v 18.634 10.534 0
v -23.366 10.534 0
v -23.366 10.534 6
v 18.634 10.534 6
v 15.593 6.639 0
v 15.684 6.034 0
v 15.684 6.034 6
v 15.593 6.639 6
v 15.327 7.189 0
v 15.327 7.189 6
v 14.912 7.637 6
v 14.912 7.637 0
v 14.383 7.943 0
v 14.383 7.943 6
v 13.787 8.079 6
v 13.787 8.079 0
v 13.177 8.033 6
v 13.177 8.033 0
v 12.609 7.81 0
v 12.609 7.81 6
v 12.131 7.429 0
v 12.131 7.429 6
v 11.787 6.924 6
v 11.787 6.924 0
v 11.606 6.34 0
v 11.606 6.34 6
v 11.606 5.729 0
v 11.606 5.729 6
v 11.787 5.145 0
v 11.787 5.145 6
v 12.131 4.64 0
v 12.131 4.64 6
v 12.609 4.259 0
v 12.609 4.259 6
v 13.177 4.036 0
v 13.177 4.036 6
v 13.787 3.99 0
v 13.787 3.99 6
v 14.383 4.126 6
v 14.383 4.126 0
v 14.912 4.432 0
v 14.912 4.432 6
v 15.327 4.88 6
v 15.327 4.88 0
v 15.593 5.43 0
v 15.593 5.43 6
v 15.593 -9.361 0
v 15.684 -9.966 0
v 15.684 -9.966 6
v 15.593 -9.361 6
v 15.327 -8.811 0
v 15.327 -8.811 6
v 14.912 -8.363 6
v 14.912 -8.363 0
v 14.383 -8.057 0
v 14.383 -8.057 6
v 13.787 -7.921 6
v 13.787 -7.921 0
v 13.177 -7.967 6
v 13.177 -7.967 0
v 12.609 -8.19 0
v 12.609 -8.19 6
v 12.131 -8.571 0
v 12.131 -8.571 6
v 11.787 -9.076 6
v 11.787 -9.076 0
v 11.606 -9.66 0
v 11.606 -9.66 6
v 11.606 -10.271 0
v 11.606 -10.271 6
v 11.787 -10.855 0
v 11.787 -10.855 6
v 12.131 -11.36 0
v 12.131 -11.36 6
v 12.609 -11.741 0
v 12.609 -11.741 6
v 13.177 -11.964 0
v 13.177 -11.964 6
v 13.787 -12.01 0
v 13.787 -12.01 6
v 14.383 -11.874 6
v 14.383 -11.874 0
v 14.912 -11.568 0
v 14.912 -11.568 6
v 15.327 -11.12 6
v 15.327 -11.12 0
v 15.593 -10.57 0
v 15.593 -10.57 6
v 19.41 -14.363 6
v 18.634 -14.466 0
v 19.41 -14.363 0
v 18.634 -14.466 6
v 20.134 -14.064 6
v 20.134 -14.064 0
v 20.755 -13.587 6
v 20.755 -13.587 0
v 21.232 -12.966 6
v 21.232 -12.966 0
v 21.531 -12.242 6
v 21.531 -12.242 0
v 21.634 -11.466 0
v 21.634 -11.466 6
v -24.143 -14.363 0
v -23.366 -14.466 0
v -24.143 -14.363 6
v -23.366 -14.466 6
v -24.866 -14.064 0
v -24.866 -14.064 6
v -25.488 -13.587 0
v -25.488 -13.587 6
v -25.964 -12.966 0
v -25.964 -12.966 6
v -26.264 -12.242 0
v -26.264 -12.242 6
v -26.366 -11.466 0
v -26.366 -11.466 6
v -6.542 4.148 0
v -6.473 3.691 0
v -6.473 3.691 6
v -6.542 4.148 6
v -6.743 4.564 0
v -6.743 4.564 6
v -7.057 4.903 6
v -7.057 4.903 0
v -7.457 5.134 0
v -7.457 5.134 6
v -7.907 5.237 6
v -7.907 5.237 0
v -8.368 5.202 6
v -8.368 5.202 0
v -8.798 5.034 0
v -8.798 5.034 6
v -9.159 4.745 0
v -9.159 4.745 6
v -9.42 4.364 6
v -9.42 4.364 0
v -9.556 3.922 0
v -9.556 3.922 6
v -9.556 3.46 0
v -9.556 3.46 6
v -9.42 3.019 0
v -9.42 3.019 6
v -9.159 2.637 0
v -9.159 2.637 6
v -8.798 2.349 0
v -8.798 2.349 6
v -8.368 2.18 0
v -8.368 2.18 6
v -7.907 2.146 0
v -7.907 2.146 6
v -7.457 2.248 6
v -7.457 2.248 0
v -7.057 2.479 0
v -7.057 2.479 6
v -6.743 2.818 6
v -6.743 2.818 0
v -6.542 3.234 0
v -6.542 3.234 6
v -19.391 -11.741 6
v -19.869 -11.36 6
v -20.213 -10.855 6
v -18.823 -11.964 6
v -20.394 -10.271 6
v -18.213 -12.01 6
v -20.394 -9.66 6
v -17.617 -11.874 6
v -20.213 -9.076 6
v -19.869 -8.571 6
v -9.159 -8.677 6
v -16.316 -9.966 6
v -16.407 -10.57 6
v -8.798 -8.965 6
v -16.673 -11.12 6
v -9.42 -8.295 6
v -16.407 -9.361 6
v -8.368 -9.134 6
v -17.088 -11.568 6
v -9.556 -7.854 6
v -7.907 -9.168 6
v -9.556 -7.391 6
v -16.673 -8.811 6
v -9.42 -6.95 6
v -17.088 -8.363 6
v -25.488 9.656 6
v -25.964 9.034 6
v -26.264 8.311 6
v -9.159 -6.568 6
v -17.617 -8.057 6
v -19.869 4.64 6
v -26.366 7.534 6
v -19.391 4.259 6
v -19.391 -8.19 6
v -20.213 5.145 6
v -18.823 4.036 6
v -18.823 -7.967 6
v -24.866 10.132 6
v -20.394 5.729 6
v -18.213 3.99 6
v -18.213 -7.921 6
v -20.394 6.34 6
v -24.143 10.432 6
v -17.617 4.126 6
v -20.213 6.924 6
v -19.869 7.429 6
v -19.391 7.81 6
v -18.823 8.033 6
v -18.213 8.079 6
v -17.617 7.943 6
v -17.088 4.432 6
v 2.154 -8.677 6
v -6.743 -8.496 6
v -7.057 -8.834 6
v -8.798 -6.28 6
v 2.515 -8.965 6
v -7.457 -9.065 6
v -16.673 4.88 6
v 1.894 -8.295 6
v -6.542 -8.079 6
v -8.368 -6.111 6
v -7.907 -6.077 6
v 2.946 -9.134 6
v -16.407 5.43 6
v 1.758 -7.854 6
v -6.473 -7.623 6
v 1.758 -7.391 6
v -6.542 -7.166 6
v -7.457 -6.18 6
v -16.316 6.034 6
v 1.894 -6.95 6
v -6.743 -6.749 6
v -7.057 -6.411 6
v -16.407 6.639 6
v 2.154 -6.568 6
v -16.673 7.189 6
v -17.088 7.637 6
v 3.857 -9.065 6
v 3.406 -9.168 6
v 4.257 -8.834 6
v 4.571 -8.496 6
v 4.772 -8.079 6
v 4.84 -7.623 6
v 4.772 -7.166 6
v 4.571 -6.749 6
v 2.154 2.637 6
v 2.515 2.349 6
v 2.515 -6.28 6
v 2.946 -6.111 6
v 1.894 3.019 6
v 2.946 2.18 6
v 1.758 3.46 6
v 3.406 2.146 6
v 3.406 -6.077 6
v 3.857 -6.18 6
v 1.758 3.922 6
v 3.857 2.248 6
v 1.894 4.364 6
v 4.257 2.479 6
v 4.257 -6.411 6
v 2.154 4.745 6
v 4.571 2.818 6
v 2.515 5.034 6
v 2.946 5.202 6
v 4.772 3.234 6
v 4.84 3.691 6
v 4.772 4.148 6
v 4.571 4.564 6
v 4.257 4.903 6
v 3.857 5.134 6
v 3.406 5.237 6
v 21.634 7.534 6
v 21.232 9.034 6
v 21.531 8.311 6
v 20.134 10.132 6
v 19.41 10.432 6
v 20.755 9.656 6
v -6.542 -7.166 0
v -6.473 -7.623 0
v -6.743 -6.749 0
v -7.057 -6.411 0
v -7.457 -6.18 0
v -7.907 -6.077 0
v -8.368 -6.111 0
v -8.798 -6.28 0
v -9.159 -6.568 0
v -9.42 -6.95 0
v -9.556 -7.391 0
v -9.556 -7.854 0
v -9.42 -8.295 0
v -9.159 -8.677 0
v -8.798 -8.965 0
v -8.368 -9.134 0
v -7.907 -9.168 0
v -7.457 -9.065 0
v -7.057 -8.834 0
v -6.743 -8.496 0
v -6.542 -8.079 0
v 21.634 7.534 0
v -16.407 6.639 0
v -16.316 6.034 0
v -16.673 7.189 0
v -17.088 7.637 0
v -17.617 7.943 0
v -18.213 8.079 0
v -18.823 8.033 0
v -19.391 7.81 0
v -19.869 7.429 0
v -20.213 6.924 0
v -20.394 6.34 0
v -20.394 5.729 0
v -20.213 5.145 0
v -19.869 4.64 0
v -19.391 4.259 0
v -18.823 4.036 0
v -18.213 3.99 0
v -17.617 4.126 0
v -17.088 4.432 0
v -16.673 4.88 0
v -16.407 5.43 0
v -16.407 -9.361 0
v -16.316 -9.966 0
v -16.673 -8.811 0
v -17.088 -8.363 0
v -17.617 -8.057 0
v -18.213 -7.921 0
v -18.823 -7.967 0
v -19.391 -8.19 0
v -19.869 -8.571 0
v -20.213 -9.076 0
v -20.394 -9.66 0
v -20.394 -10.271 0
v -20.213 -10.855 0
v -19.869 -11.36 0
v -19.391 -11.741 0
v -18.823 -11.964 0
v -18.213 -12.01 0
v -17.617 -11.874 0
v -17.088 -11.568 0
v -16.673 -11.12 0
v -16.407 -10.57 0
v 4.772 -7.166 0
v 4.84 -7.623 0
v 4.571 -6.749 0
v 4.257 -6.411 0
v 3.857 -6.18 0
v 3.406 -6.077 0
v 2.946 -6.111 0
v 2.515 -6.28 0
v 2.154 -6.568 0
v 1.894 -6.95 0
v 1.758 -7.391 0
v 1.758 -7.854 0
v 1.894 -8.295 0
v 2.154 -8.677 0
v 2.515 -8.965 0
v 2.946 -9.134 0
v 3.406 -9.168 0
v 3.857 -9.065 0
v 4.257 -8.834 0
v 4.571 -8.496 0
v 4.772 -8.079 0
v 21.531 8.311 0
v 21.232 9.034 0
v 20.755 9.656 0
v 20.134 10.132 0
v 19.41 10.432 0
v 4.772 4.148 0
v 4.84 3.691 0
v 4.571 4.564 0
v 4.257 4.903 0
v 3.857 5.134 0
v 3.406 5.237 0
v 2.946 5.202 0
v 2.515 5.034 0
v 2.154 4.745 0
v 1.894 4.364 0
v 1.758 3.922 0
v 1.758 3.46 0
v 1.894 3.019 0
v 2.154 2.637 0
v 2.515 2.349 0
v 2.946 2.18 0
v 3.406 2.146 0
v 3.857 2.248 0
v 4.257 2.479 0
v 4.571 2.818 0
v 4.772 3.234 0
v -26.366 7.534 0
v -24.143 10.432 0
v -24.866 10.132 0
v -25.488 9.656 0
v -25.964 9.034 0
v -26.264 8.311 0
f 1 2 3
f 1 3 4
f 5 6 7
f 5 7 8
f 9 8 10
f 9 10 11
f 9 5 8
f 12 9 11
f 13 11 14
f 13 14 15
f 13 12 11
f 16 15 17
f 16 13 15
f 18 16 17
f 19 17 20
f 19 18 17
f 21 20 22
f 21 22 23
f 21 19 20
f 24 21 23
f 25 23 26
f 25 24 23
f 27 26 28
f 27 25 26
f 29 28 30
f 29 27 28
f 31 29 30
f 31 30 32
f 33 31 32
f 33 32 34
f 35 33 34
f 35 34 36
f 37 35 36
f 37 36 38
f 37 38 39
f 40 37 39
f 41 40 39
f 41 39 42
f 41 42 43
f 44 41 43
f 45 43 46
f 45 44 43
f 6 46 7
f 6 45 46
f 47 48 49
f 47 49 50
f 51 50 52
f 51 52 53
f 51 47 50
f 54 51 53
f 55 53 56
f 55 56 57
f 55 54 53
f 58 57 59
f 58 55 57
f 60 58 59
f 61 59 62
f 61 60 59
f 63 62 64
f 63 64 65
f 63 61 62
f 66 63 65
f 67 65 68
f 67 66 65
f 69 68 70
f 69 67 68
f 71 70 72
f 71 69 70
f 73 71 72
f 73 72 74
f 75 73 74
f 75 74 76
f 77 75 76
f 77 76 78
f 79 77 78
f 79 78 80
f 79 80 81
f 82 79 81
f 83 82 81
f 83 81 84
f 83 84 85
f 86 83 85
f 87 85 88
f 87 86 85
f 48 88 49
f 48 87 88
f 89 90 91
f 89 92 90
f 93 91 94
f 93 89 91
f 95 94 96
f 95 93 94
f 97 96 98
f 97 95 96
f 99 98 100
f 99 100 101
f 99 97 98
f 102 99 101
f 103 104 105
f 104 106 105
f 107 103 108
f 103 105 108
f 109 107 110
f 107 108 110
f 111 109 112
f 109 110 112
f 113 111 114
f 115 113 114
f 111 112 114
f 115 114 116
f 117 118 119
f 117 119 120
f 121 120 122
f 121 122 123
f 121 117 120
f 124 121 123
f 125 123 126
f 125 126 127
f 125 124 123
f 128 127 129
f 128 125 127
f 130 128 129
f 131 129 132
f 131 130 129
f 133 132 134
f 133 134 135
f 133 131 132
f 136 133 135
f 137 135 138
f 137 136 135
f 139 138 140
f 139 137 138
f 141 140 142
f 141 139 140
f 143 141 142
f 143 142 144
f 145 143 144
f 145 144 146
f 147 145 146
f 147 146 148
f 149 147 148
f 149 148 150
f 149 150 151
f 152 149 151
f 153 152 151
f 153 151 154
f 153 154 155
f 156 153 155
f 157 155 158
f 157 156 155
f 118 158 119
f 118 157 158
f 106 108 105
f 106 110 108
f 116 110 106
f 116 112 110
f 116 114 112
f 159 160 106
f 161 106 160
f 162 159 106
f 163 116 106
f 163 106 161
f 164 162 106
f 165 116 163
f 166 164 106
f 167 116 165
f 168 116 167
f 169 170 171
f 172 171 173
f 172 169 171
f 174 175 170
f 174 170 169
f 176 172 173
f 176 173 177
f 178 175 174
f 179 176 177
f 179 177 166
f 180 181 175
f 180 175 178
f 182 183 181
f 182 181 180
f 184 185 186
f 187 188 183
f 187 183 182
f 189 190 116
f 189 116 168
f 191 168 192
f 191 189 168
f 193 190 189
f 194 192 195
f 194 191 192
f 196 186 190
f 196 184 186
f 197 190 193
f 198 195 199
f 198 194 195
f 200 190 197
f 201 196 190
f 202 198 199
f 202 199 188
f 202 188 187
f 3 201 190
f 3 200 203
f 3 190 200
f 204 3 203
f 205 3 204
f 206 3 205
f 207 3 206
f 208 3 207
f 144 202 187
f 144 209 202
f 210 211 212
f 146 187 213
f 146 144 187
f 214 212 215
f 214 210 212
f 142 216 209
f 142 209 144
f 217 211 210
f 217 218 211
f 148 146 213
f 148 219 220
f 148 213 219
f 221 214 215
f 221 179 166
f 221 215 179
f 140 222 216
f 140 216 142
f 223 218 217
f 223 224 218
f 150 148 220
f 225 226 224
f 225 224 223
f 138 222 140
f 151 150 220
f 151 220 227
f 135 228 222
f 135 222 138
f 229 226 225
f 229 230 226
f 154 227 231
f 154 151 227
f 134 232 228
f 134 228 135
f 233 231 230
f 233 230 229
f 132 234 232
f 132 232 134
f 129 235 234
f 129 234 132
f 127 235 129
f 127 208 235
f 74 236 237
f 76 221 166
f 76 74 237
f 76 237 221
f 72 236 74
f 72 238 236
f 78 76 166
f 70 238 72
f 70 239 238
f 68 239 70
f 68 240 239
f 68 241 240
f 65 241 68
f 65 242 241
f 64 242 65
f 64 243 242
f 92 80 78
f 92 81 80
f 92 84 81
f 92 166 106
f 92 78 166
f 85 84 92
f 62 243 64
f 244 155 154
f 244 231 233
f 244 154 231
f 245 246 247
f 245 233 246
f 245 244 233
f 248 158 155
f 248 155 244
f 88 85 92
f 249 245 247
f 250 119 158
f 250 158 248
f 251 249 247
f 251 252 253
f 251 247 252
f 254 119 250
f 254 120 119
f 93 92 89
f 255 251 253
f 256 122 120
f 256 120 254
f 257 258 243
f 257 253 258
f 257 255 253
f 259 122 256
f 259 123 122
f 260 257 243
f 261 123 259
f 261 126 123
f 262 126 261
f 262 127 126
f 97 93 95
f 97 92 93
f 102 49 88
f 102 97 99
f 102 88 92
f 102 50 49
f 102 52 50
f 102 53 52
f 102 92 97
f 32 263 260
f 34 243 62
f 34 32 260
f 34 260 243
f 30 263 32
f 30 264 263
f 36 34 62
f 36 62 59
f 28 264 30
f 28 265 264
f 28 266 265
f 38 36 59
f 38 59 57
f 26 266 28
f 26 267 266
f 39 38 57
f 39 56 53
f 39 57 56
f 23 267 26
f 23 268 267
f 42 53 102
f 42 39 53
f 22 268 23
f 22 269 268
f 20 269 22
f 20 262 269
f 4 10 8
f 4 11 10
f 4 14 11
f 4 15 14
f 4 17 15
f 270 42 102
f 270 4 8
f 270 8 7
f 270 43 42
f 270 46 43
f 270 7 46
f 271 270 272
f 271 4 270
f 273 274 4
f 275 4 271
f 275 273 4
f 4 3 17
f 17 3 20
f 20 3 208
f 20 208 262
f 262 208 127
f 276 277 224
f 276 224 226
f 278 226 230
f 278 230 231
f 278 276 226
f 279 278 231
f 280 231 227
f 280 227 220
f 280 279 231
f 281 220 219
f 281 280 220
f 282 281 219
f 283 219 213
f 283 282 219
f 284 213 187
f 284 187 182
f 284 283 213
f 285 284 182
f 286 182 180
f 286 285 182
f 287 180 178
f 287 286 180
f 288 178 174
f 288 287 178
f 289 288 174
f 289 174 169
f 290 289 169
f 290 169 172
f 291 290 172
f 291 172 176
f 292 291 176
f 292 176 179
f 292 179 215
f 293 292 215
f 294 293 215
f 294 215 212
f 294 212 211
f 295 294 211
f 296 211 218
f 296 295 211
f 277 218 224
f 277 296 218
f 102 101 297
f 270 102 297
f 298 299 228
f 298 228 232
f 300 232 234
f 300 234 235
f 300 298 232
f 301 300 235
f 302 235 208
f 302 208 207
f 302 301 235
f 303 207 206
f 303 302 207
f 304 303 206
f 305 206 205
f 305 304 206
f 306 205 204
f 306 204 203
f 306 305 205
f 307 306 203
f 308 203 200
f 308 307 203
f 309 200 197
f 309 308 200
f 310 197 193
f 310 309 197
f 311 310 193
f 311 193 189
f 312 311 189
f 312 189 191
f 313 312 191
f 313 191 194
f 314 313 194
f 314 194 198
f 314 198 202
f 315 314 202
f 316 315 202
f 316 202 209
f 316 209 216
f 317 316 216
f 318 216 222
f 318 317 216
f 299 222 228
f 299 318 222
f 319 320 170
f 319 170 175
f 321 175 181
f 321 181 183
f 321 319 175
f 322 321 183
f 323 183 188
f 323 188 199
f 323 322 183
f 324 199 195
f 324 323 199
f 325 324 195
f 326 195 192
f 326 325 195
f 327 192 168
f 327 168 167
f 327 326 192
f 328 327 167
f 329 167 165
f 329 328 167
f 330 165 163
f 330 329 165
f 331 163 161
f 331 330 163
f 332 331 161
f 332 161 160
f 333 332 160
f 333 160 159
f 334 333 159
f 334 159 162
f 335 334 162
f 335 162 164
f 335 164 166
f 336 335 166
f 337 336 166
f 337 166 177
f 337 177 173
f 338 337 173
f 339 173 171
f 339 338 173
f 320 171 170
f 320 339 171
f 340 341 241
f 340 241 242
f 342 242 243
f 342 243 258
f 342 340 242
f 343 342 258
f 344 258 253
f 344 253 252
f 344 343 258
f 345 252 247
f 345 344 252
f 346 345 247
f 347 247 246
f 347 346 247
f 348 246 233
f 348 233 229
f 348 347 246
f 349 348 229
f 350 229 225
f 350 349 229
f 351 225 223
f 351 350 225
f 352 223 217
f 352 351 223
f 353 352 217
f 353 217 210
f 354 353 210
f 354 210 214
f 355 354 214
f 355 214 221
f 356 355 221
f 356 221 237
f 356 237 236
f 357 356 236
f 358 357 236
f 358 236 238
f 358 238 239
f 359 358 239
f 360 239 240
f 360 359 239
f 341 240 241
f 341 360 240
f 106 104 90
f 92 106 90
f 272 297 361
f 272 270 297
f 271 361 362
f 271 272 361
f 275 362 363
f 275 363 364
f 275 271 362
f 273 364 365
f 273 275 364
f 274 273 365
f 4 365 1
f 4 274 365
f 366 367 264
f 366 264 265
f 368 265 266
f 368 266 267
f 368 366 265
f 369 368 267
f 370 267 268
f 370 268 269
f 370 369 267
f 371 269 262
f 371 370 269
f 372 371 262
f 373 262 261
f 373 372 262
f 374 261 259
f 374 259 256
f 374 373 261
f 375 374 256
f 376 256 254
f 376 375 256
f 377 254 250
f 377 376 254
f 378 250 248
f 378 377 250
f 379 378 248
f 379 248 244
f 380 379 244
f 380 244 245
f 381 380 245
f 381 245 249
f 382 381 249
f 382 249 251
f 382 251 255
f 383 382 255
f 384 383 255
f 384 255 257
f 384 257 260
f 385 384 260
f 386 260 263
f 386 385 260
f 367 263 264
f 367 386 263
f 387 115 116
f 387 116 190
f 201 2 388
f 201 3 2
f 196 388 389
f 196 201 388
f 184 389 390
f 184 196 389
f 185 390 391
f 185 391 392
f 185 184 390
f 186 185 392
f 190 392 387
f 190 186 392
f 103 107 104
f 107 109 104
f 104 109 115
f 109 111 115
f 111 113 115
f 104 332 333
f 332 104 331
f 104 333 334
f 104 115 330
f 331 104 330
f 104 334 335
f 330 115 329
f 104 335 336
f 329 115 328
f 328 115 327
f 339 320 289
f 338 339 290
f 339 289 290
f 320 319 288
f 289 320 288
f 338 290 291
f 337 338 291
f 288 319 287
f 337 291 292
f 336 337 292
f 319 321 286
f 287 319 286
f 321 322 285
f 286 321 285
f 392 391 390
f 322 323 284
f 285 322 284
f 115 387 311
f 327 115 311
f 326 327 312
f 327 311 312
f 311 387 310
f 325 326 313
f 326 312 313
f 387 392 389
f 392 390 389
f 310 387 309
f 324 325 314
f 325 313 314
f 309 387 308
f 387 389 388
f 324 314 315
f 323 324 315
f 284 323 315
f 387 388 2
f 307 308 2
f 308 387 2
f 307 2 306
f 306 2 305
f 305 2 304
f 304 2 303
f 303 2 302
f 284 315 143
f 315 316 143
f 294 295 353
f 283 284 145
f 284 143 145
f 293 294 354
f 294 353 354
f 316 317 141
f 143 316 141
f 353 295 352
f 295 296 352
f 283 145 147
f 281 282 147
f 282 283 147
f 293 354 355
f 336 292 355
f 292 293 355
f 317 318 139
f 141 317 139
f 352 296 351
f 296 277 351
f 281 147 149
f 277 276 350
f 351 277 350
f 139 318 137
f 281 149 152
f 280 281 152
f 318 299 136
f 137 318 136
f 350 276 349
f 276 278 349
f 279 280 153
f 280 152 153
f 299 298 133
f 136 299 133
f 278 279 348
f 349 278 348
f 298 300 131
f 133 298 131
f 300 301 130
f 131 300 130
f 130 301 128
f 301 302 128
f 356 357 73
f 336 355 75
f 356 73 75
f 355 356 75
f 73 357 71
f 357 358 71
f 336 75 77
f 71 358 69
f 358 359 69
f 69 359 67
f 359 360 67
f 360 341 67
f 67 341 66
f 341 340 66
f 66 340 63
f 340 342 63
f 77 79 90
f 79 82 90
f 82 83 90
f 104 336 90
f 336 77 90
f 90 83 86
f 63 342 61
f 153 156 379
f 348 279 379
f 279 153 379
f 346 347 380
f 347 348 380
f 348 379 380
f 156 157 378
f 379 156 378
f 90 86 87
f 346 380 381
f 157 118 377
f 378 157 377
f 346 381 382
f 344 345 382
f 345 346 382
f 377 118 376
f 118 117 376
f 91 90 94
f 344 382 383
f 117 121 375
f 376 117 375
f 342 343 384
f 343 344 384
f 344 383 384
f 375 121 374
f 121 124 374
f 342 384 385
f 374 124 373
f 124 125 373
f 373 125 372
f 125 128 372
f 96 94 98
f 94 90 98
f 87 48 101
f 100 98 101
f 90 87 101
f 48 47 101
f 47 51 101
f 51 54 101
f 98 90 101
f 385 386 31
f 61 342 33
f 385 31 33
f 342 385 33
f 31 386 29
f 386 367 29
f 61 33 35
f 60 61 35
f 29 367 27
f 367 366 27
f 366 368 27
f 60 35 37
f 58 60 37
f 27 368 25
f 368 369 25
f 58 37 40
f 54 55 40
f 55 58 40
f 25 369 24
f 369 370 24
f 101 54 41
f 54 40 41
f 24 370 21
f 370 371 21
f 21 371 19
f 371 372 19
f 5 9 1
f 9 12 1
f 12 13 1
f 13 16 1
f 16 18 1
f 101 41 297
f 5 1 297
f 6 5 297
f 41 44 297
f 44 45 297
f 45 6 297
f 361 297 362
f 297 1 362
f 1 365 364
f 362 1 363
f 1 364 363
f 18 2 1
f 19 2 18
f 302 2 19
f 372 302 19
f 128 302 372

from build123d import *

# Parameters (mm, degrees)
SKETCH1_W           = 48
SKETCH1_H           = 25
SKETCH1_R           = 1.55
SKETCH1_R_2         = 2.05
BOSS_EXTRUDE1_DEPTH = 6
FILLET1_R           = 3
FILLET2_R           = 3
FILLET3_R           = 3
FILLET4_R           = 3


with BuildPart() as part:
    # Sketch1 → Boss-Extrude1 (new body)
    with BuildSketch(Plane.XY):
        with Locations((-2.366412214, -1.965648855)):
            Rectangle(SKETCH1_W, SKETCH1_H)
        with Locations((-8.023266463, 3.691205395)):
            Circle(SKETCH1_R, mode=Mode.SUBTRACT)
        with Locations((-8.023266463, -7.622503104)):
            Circle(SKETCH1_R, mode=Mode.SUBTRACT)
        with Locations((3.290442036, -7.622503104)):
            Circle(SKETCH1_R, mode=Mode.SUBTRACT)
        with Locations((3.290442036, 3.691205395)):
            Circle(SKETCH1_R, mode=Mode.SUBTRACT)
        with Locations((-18.366412214, 6.034351145)):
            Circle(SKETCH1_R_2, mode=Mode.SUBTRACT)
        with Locations((13.633587786, 6.034351145)):
            Circle(SKETCH1_R_2, mode=Mode.SUBTRACT)
        with Locations((13.633587786, -9.965648855)):
            Circle(SKETCH1_R_2, mode=Mode.SUBTRACT)
        with Locations((-18.366412214, -9.965648855)):
            Circle(SKETCH1_R_2, mode=Mode.SUBTRACT)
    extrude(amount=BOSS_EXTRUDE1_DEPTH)

    # Fillet1
    fillet1_edges = [part.edges().sort_by_distance(p)[0] for p in [
        (21.633587786, -14.465648855, 3),
    ]]
    fillet(fillet1_edges, radius=FILLET1_R)

    # Fillet2
    fillet2_edges = [part.edges().sort_by_distance(p)[0] for p in [
        (-26.366412214, -14.465648855, 3),
    ]]
    fillet(fillet2_edges, radius=FILLET2_R)

    # Fillet3
    fillet3_edges = [part.edges().sort_by_distance(p)[0] for p in [
        (21.633587786, 10.534351145, 3),
    ]]
    fillet(fillet3_edges, radius=FILLET3_R)

    # Fillet4
    fillet4_edges = [part.edges().sort_by_distance(p)[0] for p in [
        (-26.366412214, 10.534351145, 3),
    ]]
    fillet(fillet4_edges, radius=FILLET4_R)


solid = part.part
